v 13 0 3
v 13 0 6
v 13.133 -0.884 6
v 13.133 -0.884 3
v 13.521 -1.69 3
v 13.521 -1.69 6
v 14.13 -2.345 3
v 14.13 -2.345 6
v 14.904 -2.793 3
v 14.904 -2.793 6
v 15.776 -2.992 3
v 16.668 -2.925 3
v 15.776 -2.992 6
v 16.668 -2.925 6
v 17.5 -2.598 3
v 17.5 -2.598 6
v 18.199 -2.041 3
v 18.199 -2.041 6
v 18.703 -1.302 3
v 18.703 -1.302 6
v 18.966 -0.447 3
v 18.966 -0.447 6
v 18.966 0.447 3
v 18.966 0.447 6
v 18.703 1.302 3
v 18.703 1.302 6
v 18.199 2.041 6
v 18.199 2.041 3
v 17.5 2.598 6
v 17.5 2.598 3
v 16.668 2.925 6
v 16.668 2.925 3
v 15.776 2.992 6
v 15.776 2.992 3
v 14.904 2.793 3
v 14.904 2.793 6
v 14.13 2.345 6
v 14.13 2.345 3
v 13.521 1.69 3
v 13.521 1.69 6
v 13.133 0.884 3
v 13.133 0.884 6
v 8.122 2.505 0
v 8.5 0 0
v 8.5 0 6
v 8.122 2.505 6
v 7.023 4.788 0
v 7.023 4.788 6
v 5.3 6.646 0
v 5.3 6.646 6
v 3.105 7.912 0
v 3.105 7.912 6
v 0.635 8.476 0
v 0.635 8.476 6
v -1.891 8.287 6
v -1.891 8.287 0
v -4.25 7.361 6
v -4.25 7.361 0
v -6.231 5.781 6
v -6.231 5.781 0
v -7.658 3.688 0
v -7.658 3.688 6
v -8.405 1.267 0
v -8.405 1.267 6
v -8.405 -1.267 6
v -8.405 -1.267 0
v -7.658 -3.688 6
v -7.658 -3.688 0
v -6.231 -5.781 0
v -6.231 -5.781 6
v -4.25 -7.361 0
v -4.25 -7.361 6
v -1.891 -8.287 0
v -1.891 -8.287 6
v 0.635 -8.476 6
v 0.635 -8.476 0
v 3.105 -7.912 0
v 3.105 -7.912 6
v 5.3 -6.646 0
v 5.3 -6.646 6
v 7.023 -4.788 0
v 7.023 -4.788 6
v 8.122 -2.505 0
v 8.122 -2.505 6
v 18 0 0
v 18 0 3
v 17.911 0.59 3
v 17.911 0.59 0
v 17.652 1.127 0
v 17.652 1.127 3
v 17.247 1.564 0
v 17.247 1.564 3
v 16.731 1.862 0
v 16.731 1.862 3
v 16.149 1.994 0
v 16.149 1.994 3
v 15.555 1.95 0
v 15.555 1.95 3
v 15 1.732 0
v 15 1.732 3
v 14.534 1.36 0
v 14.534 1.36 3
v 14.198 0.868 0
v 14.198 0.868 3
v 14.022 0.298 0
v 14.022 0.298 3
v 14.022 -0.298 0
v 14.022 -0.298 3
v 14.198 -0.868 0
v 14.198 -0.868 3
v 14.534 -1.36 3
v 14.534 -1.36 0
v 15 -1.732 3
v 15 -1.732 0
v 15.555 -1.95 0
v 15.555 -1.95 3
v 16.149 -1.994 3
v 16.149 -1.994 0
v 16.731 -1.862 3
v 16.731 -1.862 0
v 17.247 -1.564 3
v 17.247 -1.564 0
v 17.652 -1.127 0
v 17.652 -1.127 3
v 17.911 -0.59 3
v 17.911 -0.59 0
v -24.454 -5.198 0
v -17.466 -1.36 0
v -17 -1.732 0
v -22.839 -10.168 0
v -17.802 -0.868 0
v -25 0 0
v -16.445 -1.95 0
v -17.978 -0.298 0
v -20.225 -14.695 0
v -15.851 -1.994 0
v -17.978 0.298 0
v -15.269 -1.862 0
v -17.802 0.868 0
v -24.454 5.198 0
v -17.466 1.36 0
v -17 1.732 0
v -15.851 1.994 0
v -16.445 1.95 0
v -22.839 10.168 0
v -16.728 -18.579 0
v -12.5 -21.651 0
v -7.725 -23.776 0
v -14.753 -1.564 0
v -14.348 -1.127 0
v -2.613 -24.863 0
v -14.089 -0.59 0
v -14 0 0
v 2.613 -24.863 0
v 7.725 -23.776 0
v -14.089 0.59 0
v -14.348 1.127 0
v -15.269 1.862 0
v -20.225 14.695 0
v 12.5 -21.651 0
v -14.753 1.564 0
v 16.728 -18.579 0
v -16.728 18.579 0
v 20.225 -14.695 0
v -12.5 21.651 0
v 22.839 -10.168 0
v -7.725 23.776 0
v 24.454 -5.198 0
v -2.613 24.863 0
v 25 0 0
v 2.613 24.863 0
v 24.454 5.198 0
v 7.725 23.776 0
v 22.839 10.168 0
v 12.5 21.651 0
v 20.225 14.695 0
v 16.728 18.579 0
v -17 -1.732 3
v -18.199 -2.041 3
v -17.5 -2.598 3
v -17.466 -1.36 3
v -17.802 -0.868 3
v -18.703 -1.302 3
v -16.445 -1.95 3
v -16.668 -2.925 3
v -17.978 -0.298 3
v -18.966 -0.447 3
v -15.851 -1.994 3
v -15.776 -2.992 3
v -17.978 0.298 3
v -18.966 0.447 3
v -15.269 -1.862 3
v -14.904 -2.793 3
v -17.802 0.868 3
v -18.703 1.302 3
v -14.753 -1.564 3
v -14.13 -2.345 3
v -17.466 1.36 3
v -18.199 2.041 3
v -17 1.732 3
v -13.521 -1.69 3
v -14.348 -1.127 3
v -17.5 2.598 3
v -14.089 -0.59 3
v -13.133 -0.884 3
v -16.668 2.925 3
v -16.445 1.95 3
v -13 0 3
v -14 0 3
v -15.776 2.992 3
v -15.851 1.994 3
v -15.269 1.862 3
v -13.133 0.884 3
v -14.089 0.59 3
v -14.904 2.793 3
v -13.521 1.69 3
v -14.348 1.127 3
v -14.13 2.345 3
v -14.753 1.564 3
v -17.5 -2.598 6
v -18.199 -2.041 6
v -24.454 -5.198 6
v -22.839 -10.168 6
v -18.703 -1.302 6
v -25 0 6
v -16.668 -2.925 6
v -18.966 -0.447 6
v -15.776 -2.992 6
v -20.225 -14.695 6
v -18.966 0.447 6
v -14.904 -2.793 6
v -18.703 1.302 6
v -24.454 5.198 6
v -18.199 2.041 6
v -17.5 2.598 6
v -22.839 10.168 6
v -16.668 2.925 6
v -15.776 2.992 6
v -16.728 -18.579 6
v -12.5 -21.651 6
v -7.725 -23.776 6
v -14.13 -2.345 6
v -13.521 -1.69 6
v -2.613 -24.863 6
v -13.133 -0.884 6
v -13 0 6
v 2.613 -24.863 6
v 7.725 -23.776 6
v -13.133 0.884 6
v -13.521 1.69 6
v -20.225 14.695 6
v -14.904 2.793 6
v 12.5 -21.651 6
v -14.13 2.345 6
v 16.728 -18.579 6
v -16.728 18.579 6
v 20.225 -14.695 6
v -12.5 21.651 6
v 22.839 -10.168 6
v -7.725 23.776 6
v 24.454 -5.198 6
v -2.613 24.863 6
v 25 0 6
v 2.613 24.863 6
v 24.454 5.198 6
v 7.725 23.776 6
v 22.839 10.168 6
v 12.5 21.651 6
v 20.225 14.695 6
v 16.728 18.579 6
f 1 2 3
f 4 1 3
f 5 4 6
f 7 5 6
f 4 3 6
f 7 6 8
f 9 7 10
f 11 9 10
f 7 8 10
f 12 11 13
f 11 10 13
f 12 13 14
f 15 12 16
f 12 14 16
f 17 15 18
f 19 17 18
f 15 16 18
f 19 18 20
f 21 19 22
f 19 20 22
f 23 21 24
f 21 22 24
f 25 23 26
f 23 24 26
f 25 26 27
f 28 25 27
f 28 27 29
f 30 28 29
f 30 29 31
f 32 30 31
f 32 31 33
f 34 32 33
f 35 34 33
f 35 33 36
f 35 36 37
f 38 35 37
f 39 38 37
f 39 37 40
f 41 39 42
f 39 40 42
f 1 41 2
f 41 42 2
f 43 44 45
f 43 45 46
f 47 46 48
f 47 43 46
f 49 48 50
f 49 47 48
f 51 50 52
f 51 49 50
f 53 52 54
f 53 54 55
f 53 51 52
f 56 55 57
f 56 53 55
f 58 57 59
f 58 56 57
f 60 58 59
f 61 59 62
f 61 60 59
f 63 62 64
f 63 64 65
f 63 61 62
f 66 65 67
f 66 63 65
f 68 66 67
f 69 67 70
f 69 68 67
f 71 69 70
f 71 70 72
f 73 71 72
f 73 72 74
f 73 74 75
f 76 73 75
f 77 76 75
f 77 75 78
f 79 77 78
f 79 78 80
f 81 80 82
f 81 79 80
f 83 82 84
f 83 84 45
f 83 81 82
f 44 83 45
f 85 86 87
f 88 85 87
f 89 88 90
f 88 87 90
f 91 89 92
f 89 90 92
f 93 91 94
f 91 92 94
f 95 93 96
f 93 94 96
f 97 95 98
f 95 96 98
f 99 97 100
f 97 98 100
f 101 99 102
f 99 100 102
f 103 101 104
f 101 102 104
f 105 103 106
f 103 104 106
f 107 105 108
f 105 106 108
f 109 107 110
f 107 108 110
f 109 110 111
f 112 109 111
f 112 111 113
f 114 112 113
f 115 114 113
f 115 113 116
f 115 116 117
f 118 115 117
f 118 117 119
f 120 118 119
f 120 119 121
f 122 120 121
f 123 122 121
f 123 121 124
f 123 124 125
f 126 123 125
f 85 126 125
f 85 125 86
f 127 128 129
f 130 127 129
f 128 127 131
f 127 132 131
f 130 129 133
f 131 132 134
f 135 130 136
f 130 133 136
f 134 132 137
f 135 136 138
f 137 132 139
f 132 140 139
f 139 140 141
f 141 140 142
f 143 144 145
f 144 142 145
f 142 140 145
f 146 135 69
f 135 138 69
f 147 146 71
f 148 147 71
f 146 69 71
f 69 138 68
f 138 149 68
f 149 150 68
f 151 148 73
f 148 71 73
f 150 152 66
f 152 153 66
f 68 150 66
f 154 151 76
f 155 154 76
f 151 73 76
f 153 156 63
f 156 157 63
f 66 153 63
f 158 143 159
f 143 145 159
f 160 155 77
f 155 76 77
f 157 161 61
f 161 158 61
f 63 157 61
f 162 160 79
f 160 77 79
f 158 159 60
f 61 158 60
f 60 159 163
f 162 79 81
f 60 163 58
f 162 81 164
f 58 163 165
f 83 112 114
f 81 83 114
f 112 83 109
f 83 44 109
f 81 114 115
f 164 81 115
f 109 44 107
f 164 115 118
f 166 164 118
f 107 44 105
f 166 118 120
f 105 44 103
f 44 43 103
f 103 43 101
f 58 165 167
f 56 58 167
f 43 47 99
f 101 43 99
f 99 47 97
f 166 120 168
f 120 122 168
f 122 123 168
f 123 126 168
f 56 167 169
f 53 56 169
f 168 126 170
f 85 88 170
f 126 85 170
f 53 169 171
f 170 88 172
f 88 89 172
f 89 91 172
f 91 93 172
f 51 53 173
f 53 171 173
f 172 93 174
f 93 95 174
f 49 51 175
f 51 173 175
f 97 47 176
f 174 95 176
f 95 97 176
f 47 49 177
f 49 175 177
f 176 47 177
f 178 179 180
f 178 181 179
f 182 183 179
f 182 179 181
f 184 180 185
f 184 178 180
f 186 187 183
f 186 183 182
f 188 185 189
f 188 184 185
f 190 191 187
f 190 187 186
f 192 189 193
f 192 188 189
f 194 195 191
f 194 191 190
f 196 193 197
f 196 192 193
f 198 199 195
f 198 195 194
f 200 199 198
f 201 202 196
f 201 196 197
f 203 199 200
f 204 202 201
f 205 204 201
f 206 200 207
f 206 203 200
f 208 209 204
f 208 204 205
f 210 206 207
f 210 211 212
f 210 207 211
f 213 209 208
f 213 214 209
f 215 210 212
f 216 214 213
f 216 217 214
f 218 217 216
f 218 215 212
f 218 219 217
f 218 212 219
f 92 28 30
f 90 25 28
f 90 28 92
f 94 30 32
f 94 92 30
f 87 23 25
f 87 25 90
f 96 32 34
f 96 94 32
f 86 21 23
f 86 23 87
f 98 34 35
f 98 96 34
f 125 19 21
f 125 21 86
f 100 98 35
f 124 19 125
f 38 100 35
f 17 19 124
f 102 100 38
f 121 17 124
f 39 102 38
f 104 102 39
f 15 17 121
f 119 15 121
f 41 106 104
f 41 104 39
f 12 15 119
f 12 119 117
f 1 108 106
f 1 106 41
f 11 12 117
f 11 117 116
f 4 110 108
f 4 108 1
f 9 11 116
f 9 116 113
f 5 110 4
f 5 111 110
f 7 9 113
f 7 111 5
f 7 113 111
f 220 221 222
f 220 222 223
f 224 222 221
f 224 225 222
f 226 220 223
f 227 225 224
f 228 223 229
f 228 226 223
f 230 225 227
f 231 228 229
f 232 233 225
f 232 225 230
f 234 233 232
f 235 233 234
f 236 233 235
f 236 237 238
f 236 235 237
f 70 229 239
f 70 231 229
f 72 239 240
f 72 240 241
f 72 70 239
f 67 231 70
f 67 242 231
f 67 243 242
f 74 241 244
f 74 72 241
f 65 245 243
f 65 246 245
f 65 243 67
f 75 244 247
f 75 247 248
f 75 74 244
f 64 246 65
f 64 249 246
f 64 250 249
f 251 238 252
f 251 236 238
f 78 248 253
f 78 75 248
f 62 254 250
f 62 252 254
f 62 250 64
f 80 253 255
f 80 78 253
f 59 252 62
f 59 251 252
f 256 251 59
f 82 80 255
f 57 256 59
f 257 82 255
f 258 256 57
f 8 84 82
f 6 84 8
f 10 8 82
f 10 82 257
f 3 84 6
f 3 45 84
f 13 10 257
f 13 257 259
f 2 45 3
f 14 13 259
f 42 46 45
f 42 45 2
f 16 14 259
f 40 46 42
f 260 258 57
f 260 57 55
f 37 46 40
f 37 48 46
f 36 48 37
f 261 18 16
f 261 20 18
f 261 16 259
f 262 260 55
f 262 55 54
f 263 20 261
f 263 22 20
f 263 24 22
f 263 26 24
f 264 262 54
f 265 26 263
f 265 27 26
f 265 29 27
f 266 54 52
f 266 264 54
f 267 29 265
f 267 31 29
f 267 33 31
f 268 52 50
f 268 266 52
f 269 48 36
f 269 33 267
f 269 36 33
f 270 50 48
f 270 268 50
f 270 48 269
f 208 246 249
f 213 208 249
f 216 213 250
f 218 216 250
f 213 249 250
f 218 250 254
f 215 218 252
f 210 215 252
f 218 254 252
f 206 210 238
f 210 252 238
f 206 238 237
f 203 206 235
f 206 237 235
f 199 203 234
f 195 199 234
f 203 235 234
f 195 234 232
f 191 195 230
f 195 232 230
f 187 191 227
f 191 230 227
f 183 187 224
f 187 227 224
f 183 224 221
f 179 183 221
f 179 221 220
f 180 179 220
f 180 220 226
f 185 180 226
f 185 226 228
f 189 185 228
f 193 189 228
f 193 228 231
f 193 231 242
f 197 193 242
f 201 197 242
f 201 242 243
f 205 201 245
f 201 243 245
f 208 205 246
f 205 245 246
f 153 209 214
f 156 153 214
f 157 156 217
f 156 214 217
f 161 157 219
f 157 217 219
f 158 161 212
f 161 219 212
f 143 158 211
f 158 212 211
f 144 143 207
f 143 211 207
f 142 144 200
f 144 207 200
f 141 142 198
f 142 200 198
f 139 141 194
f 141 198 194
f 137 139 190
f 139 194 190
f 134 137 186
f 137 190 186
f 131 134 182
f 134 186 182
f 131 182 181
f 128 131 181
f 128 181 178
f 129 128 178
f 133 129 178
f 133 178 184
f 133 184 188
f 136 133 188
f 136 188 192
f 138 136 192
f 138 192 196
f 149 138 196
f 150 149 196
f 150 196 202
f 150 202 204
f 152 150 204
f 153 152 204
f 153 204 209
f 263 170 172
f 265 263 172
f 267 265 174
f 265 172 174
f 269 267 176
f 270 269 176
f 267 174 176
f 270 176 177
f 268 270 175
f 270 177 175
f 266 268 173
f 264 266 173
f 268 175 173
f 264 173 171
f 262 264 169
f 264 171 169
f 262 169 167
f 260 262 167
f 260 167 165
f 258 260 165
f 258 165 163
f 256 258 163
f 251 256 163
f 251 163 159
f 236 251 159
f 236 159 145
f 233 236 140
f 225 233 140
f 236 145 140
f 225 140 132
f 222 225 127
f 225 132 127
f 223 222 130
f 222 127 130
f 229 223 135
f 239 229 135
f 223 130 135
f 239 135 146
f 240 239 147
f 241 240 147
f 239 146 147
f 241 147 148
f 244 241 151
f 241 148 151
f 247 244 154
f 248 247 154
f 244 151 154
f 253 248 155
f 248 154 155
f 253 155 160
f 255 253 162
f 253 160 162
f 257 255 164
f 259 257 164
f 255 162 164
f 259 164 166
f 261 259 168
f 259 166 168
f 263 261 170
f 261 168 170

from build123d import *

# Parameters (mm, degrees)
ESQUISSE1_R             = 25
ESQUISSE1_R_2           = 8.5
BOSS_EXTRU_3_DEPTH      = 6
ESQUISSE6_R             = 3
ENL_V_MAT_EXTRU_7_DEPTH = 3
ESQUISSE7_R             = 2
ENL_V_MAT_EXTRU_8_DEPTH = 91


with BuildPart() as part:
    # Esquisse1 → Boss.-Extru.3 (new body)
    with BuildSketch(Plane.XY):
        Circle(ESQUISSE1_R)
        Circle(ESQUISSE1_R_2, mode=Mode.SUBTRACT)
    extrude(amount=BOSS_EXTRU_3_DEPTH)

    # Esquisse6 → Enlèv. mat.-Extru.7 (cut)
    with BuildSketch(Plane.XY.offset(6)):
        with Locations((-16, 0)):
            Circle(ESQUISSE6_R)
        with Locations(Location((16, 0, 0), (0, 0, 180))):
            Circle(ESQUISSE6_R)
    extrude(amount=-ENL_V_MAT_EXTRU_7_DEPTH, mode=Mode.SUBTRACT)

    # Esquisse7 → Enlèv. mat.-Extru.8 (cut)
    with BuildSketch(Plane.XY.offset(6)):
        with Locations((-16, 0)):
            Circle(ESQUISSE7_R)
        with Locations((16, 0)):
            Circle(ESQUISSE7_R)
    extrude(amount=-ENL_V_MAT_EXTRU_8_DEPTH, mode=Mode.SUBTRACT)


solid = part.part
